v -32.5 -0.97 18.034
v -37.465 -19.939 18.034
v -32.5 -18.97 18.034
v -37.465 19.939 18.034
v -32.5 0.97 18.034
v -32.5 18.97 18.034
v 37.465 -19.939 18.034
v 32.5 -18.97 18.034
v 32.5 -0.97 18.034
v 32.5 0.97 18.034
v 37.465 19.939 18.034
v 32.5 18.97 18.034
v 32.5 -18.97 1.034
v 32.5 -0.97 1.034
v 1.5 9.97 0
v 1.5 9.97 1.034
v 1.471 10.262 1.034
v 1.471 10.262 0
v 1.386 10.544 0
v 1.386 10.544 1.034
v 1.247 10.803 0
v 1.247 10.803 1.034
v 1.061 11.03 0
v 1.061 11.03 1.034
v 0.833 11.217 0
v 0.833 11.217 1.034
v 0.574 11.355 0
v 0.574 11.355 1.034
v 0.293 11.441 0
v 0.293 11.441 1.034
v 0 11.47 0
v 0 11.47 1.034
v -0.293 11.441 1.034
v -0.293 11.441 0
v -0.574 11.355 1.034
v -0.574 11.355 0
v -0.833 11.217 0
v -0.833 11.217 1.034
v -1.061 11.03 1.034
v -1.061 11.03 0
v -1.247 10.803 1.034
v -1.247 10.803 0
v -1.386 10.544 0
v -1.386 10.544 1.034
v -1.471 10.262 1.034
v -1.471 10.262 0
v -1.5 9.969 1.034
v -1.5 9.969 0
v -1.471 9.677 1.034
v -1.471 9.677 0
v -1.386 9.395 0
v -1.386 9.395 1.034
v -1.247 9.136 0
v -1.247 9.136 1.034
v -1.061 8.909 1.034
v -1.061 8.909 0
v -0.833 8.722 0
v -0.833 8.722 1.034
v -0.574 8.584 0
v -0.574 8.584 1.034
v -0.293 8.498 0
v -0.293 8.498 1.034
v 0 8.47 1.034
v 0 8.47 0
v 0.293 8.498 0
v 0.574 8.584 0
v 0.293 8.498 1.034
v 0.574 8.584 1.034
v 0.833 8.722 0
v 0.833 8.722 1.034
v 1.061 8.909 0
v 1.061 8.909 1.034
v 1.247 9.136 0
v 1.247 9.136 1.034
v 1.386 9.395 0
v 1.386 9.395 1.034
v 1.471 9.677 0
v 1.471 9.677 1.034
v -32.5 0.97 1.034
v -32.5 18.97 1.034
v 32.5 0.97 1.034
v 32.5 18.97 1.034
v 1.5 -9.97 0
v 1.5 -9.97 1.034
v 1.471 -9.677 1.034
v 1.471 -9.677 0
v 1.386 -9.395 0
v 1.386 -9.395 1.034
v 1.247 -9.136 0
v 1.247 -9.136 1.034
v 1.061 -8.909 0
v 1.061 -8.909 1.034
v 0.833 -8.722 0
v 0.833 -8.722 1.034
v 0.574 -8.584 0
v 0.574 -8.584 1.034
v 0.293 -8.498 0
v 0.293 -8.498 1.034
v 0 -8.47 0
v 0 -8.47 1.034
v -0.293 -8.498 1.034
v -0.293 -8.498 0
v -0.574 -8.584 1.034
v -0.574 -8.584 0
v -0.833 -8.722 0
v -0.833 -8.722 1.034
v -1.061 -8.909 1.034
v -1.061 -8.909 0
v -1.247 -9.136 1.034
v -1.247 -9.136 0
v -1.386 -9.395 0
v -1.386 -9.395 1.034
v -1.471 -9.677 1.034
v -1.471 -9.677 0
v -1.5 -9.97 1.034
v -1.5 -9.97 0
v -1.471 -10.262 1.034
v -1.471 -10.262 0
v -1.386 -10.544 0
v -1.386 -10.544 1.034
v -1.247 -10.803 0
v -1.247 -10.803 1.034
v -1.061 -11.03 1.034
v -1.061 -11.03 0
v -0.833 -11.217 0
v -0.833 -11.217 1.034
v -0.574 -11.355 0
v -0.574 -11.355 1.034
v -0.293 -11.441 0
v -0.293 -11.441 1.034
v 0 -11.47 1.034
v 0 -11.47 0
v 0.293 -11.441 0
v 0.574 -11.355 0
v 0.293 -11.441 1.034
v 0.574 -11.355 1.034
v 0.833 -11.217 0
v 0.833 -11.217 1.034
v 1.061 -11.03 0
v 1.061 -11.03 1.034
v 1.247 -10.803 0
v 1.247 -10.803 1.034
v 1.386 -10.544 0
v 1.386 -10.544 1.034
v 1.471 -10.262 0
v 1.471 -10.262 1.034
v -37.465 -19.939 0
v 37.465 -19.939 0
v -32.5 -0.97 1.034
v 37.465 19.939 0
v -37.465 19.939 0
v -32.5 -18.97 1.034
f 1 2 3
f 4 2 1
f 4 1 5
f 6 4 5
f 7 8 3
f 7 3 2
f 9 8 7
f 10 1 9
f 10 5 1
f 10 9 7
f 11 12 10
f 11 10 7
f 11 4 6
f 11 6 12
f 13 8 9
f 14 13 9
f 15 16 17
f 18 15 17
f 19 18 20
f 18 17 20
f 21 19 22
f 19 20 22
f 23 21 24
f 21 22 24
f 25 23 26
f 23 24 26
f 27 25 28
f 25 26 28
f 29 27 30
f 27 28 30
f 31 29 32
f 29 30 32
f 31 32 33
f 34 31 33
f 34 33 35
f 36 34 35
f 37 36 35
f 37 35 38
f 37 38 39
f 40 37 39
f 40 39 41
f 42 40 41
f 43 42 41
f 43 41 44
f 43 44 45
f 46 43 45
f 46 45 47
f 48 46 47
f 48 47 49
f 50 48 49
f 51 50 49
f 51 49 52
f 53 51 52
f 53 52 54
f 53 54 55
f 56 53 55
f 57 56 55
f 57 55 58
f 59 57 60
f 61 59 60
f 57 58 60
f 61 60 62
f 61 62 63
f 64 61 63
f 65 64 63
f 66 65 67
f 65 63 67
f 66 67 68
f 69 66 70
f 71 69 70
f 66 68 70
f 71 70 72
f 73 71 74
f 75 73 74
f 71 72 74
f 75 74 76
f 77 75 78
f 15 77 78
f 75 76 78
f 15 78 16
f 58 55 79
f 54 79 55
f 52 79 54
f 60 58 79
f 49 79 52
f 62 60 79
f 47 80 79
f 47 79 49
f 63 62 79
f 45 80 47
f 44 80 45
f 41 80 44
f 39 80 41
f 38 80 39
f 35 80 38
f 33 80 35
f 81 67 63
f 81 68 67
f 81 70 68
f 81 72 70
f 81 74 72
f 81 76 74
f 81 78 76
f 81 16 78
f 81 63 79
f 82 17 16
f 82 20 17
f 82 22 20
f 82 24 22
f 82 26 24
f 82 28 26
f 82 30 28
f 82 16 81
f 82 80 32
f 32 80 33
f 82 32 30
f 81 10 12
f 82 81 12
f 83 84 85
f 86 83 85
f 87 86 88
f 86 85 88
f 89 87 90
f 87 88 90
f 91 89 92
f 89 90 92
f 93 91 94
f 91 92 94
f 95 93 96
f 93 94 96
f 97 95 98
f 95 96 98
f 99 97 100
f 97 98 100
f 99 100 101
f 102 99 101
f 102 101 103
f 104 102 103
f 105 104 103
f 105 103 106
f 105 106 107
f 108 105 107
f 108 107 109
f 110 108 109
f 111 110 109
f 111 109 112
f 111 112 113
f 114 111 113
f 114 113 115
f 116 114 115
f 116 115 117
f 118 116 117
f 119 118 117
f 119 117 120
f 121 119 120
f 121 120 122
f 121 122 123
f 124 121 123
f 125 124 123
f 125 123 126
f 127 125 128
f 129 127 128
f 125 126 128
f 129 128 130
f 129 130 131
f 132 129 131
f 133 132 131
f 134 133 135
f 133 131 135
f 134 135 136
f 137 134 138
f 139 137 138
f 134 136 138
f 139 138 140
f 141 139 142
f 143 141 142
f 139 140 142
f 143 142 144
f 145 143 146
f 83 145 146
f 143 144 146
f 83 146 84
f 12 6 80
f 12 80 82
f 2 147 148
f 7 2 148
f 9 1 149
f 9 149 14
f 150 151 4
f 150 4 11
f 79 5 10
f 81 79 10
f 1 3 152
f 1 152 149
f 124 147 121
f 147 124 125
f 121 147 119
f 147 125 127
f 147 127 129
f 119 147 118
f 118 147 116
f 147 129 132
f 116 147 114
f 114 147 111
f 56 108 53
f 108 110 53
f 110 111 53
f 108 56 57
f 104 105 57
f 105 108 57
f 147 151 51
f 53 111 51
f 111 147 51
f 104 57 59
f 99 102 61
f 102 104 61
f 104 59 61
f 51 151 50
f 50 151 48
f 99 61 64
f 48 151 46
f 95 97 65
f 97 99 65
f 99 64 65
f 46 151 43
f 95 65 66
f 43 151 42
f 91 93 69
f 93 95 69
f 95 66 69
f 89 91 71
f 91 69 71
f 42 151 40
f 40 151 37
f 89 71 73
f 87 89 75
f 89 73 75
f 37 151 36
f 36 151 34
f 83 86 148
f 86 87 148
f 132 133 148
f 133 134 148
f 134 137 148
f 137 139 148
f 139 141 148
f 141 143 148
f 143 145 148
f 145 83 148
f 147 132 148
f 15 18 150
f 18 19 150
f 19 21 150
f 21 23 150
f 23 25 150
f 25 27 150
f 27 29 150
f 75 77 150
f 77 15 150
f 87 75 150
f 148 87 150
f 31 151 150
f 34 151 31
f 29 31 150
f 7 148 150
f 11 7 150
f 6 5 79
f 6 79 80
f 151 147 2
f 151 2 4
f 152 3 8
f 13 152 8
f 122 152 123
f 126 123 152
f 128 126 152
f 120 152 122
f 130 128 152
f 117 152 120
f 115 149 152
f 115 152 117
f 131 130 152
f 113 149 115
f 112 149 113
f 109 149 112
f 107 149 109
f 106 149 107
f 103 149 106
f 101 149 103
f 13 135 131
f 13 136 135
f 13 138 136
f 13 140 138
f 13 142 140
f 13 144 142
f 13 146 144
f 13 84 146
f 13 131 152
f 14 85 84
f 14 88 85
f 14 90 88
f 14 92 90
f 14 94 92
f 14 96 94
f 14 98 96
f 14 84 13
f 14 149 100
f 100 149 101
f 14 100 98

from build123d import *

# Parameters (mm, degrees)
SKETCH1_W           = 74.93
SKETCH1_H           = 39.878
BOSS_EXTRUDE1_DEPTH = 18.034
SKETCH2_R           = 1.5
CUT_EXTRUDE1_DEPTH  = 18.034
SKETCH3_W           = 65
SKETCH3_H           = 18
CUT_EXTRUDE2_DEPTH  = 17


with BuildPart() as part:
    # Sketch1 → Boss-Extrude1 (new body)
    with BuildSketch(Plane.XY):
        Rectangle(SKETCH1_W, SKETCH1_H)
    extrude(amount=BOSS_EXTRUDE1_DEPTH)

    # Sketch2 → Cut-Extrude1 (cut)
    with BuildSketch(Plane.XY.offset(18.034)):
        with Locations((0, -9.9695)):
            Circle(SKETCH2_R)
        with Locations((0, 9.9695)):
            Circle(SKETCH2_R)
    extrude(amount=-CUT_EXTRUDE1_DEPTH, mode=Mode.SUBTRACT)

    # Sketch3 → Cut-Extrude2 (cut)
    with BuildSketch(Plane.XY.offset(18.034)):
        with Locations((0, 9.9695)):
            Rectangle(SKETCH3_W, SKETCH3_H)
        with Locations((0, -9.9695)):
            Rectangle(SKETCH3_W, SKETCH3_H)
    extrude(amount=-CUT_EXTRUDE2_DEPTH, mode=Mode.SUBTRACT)


solid = part.part
